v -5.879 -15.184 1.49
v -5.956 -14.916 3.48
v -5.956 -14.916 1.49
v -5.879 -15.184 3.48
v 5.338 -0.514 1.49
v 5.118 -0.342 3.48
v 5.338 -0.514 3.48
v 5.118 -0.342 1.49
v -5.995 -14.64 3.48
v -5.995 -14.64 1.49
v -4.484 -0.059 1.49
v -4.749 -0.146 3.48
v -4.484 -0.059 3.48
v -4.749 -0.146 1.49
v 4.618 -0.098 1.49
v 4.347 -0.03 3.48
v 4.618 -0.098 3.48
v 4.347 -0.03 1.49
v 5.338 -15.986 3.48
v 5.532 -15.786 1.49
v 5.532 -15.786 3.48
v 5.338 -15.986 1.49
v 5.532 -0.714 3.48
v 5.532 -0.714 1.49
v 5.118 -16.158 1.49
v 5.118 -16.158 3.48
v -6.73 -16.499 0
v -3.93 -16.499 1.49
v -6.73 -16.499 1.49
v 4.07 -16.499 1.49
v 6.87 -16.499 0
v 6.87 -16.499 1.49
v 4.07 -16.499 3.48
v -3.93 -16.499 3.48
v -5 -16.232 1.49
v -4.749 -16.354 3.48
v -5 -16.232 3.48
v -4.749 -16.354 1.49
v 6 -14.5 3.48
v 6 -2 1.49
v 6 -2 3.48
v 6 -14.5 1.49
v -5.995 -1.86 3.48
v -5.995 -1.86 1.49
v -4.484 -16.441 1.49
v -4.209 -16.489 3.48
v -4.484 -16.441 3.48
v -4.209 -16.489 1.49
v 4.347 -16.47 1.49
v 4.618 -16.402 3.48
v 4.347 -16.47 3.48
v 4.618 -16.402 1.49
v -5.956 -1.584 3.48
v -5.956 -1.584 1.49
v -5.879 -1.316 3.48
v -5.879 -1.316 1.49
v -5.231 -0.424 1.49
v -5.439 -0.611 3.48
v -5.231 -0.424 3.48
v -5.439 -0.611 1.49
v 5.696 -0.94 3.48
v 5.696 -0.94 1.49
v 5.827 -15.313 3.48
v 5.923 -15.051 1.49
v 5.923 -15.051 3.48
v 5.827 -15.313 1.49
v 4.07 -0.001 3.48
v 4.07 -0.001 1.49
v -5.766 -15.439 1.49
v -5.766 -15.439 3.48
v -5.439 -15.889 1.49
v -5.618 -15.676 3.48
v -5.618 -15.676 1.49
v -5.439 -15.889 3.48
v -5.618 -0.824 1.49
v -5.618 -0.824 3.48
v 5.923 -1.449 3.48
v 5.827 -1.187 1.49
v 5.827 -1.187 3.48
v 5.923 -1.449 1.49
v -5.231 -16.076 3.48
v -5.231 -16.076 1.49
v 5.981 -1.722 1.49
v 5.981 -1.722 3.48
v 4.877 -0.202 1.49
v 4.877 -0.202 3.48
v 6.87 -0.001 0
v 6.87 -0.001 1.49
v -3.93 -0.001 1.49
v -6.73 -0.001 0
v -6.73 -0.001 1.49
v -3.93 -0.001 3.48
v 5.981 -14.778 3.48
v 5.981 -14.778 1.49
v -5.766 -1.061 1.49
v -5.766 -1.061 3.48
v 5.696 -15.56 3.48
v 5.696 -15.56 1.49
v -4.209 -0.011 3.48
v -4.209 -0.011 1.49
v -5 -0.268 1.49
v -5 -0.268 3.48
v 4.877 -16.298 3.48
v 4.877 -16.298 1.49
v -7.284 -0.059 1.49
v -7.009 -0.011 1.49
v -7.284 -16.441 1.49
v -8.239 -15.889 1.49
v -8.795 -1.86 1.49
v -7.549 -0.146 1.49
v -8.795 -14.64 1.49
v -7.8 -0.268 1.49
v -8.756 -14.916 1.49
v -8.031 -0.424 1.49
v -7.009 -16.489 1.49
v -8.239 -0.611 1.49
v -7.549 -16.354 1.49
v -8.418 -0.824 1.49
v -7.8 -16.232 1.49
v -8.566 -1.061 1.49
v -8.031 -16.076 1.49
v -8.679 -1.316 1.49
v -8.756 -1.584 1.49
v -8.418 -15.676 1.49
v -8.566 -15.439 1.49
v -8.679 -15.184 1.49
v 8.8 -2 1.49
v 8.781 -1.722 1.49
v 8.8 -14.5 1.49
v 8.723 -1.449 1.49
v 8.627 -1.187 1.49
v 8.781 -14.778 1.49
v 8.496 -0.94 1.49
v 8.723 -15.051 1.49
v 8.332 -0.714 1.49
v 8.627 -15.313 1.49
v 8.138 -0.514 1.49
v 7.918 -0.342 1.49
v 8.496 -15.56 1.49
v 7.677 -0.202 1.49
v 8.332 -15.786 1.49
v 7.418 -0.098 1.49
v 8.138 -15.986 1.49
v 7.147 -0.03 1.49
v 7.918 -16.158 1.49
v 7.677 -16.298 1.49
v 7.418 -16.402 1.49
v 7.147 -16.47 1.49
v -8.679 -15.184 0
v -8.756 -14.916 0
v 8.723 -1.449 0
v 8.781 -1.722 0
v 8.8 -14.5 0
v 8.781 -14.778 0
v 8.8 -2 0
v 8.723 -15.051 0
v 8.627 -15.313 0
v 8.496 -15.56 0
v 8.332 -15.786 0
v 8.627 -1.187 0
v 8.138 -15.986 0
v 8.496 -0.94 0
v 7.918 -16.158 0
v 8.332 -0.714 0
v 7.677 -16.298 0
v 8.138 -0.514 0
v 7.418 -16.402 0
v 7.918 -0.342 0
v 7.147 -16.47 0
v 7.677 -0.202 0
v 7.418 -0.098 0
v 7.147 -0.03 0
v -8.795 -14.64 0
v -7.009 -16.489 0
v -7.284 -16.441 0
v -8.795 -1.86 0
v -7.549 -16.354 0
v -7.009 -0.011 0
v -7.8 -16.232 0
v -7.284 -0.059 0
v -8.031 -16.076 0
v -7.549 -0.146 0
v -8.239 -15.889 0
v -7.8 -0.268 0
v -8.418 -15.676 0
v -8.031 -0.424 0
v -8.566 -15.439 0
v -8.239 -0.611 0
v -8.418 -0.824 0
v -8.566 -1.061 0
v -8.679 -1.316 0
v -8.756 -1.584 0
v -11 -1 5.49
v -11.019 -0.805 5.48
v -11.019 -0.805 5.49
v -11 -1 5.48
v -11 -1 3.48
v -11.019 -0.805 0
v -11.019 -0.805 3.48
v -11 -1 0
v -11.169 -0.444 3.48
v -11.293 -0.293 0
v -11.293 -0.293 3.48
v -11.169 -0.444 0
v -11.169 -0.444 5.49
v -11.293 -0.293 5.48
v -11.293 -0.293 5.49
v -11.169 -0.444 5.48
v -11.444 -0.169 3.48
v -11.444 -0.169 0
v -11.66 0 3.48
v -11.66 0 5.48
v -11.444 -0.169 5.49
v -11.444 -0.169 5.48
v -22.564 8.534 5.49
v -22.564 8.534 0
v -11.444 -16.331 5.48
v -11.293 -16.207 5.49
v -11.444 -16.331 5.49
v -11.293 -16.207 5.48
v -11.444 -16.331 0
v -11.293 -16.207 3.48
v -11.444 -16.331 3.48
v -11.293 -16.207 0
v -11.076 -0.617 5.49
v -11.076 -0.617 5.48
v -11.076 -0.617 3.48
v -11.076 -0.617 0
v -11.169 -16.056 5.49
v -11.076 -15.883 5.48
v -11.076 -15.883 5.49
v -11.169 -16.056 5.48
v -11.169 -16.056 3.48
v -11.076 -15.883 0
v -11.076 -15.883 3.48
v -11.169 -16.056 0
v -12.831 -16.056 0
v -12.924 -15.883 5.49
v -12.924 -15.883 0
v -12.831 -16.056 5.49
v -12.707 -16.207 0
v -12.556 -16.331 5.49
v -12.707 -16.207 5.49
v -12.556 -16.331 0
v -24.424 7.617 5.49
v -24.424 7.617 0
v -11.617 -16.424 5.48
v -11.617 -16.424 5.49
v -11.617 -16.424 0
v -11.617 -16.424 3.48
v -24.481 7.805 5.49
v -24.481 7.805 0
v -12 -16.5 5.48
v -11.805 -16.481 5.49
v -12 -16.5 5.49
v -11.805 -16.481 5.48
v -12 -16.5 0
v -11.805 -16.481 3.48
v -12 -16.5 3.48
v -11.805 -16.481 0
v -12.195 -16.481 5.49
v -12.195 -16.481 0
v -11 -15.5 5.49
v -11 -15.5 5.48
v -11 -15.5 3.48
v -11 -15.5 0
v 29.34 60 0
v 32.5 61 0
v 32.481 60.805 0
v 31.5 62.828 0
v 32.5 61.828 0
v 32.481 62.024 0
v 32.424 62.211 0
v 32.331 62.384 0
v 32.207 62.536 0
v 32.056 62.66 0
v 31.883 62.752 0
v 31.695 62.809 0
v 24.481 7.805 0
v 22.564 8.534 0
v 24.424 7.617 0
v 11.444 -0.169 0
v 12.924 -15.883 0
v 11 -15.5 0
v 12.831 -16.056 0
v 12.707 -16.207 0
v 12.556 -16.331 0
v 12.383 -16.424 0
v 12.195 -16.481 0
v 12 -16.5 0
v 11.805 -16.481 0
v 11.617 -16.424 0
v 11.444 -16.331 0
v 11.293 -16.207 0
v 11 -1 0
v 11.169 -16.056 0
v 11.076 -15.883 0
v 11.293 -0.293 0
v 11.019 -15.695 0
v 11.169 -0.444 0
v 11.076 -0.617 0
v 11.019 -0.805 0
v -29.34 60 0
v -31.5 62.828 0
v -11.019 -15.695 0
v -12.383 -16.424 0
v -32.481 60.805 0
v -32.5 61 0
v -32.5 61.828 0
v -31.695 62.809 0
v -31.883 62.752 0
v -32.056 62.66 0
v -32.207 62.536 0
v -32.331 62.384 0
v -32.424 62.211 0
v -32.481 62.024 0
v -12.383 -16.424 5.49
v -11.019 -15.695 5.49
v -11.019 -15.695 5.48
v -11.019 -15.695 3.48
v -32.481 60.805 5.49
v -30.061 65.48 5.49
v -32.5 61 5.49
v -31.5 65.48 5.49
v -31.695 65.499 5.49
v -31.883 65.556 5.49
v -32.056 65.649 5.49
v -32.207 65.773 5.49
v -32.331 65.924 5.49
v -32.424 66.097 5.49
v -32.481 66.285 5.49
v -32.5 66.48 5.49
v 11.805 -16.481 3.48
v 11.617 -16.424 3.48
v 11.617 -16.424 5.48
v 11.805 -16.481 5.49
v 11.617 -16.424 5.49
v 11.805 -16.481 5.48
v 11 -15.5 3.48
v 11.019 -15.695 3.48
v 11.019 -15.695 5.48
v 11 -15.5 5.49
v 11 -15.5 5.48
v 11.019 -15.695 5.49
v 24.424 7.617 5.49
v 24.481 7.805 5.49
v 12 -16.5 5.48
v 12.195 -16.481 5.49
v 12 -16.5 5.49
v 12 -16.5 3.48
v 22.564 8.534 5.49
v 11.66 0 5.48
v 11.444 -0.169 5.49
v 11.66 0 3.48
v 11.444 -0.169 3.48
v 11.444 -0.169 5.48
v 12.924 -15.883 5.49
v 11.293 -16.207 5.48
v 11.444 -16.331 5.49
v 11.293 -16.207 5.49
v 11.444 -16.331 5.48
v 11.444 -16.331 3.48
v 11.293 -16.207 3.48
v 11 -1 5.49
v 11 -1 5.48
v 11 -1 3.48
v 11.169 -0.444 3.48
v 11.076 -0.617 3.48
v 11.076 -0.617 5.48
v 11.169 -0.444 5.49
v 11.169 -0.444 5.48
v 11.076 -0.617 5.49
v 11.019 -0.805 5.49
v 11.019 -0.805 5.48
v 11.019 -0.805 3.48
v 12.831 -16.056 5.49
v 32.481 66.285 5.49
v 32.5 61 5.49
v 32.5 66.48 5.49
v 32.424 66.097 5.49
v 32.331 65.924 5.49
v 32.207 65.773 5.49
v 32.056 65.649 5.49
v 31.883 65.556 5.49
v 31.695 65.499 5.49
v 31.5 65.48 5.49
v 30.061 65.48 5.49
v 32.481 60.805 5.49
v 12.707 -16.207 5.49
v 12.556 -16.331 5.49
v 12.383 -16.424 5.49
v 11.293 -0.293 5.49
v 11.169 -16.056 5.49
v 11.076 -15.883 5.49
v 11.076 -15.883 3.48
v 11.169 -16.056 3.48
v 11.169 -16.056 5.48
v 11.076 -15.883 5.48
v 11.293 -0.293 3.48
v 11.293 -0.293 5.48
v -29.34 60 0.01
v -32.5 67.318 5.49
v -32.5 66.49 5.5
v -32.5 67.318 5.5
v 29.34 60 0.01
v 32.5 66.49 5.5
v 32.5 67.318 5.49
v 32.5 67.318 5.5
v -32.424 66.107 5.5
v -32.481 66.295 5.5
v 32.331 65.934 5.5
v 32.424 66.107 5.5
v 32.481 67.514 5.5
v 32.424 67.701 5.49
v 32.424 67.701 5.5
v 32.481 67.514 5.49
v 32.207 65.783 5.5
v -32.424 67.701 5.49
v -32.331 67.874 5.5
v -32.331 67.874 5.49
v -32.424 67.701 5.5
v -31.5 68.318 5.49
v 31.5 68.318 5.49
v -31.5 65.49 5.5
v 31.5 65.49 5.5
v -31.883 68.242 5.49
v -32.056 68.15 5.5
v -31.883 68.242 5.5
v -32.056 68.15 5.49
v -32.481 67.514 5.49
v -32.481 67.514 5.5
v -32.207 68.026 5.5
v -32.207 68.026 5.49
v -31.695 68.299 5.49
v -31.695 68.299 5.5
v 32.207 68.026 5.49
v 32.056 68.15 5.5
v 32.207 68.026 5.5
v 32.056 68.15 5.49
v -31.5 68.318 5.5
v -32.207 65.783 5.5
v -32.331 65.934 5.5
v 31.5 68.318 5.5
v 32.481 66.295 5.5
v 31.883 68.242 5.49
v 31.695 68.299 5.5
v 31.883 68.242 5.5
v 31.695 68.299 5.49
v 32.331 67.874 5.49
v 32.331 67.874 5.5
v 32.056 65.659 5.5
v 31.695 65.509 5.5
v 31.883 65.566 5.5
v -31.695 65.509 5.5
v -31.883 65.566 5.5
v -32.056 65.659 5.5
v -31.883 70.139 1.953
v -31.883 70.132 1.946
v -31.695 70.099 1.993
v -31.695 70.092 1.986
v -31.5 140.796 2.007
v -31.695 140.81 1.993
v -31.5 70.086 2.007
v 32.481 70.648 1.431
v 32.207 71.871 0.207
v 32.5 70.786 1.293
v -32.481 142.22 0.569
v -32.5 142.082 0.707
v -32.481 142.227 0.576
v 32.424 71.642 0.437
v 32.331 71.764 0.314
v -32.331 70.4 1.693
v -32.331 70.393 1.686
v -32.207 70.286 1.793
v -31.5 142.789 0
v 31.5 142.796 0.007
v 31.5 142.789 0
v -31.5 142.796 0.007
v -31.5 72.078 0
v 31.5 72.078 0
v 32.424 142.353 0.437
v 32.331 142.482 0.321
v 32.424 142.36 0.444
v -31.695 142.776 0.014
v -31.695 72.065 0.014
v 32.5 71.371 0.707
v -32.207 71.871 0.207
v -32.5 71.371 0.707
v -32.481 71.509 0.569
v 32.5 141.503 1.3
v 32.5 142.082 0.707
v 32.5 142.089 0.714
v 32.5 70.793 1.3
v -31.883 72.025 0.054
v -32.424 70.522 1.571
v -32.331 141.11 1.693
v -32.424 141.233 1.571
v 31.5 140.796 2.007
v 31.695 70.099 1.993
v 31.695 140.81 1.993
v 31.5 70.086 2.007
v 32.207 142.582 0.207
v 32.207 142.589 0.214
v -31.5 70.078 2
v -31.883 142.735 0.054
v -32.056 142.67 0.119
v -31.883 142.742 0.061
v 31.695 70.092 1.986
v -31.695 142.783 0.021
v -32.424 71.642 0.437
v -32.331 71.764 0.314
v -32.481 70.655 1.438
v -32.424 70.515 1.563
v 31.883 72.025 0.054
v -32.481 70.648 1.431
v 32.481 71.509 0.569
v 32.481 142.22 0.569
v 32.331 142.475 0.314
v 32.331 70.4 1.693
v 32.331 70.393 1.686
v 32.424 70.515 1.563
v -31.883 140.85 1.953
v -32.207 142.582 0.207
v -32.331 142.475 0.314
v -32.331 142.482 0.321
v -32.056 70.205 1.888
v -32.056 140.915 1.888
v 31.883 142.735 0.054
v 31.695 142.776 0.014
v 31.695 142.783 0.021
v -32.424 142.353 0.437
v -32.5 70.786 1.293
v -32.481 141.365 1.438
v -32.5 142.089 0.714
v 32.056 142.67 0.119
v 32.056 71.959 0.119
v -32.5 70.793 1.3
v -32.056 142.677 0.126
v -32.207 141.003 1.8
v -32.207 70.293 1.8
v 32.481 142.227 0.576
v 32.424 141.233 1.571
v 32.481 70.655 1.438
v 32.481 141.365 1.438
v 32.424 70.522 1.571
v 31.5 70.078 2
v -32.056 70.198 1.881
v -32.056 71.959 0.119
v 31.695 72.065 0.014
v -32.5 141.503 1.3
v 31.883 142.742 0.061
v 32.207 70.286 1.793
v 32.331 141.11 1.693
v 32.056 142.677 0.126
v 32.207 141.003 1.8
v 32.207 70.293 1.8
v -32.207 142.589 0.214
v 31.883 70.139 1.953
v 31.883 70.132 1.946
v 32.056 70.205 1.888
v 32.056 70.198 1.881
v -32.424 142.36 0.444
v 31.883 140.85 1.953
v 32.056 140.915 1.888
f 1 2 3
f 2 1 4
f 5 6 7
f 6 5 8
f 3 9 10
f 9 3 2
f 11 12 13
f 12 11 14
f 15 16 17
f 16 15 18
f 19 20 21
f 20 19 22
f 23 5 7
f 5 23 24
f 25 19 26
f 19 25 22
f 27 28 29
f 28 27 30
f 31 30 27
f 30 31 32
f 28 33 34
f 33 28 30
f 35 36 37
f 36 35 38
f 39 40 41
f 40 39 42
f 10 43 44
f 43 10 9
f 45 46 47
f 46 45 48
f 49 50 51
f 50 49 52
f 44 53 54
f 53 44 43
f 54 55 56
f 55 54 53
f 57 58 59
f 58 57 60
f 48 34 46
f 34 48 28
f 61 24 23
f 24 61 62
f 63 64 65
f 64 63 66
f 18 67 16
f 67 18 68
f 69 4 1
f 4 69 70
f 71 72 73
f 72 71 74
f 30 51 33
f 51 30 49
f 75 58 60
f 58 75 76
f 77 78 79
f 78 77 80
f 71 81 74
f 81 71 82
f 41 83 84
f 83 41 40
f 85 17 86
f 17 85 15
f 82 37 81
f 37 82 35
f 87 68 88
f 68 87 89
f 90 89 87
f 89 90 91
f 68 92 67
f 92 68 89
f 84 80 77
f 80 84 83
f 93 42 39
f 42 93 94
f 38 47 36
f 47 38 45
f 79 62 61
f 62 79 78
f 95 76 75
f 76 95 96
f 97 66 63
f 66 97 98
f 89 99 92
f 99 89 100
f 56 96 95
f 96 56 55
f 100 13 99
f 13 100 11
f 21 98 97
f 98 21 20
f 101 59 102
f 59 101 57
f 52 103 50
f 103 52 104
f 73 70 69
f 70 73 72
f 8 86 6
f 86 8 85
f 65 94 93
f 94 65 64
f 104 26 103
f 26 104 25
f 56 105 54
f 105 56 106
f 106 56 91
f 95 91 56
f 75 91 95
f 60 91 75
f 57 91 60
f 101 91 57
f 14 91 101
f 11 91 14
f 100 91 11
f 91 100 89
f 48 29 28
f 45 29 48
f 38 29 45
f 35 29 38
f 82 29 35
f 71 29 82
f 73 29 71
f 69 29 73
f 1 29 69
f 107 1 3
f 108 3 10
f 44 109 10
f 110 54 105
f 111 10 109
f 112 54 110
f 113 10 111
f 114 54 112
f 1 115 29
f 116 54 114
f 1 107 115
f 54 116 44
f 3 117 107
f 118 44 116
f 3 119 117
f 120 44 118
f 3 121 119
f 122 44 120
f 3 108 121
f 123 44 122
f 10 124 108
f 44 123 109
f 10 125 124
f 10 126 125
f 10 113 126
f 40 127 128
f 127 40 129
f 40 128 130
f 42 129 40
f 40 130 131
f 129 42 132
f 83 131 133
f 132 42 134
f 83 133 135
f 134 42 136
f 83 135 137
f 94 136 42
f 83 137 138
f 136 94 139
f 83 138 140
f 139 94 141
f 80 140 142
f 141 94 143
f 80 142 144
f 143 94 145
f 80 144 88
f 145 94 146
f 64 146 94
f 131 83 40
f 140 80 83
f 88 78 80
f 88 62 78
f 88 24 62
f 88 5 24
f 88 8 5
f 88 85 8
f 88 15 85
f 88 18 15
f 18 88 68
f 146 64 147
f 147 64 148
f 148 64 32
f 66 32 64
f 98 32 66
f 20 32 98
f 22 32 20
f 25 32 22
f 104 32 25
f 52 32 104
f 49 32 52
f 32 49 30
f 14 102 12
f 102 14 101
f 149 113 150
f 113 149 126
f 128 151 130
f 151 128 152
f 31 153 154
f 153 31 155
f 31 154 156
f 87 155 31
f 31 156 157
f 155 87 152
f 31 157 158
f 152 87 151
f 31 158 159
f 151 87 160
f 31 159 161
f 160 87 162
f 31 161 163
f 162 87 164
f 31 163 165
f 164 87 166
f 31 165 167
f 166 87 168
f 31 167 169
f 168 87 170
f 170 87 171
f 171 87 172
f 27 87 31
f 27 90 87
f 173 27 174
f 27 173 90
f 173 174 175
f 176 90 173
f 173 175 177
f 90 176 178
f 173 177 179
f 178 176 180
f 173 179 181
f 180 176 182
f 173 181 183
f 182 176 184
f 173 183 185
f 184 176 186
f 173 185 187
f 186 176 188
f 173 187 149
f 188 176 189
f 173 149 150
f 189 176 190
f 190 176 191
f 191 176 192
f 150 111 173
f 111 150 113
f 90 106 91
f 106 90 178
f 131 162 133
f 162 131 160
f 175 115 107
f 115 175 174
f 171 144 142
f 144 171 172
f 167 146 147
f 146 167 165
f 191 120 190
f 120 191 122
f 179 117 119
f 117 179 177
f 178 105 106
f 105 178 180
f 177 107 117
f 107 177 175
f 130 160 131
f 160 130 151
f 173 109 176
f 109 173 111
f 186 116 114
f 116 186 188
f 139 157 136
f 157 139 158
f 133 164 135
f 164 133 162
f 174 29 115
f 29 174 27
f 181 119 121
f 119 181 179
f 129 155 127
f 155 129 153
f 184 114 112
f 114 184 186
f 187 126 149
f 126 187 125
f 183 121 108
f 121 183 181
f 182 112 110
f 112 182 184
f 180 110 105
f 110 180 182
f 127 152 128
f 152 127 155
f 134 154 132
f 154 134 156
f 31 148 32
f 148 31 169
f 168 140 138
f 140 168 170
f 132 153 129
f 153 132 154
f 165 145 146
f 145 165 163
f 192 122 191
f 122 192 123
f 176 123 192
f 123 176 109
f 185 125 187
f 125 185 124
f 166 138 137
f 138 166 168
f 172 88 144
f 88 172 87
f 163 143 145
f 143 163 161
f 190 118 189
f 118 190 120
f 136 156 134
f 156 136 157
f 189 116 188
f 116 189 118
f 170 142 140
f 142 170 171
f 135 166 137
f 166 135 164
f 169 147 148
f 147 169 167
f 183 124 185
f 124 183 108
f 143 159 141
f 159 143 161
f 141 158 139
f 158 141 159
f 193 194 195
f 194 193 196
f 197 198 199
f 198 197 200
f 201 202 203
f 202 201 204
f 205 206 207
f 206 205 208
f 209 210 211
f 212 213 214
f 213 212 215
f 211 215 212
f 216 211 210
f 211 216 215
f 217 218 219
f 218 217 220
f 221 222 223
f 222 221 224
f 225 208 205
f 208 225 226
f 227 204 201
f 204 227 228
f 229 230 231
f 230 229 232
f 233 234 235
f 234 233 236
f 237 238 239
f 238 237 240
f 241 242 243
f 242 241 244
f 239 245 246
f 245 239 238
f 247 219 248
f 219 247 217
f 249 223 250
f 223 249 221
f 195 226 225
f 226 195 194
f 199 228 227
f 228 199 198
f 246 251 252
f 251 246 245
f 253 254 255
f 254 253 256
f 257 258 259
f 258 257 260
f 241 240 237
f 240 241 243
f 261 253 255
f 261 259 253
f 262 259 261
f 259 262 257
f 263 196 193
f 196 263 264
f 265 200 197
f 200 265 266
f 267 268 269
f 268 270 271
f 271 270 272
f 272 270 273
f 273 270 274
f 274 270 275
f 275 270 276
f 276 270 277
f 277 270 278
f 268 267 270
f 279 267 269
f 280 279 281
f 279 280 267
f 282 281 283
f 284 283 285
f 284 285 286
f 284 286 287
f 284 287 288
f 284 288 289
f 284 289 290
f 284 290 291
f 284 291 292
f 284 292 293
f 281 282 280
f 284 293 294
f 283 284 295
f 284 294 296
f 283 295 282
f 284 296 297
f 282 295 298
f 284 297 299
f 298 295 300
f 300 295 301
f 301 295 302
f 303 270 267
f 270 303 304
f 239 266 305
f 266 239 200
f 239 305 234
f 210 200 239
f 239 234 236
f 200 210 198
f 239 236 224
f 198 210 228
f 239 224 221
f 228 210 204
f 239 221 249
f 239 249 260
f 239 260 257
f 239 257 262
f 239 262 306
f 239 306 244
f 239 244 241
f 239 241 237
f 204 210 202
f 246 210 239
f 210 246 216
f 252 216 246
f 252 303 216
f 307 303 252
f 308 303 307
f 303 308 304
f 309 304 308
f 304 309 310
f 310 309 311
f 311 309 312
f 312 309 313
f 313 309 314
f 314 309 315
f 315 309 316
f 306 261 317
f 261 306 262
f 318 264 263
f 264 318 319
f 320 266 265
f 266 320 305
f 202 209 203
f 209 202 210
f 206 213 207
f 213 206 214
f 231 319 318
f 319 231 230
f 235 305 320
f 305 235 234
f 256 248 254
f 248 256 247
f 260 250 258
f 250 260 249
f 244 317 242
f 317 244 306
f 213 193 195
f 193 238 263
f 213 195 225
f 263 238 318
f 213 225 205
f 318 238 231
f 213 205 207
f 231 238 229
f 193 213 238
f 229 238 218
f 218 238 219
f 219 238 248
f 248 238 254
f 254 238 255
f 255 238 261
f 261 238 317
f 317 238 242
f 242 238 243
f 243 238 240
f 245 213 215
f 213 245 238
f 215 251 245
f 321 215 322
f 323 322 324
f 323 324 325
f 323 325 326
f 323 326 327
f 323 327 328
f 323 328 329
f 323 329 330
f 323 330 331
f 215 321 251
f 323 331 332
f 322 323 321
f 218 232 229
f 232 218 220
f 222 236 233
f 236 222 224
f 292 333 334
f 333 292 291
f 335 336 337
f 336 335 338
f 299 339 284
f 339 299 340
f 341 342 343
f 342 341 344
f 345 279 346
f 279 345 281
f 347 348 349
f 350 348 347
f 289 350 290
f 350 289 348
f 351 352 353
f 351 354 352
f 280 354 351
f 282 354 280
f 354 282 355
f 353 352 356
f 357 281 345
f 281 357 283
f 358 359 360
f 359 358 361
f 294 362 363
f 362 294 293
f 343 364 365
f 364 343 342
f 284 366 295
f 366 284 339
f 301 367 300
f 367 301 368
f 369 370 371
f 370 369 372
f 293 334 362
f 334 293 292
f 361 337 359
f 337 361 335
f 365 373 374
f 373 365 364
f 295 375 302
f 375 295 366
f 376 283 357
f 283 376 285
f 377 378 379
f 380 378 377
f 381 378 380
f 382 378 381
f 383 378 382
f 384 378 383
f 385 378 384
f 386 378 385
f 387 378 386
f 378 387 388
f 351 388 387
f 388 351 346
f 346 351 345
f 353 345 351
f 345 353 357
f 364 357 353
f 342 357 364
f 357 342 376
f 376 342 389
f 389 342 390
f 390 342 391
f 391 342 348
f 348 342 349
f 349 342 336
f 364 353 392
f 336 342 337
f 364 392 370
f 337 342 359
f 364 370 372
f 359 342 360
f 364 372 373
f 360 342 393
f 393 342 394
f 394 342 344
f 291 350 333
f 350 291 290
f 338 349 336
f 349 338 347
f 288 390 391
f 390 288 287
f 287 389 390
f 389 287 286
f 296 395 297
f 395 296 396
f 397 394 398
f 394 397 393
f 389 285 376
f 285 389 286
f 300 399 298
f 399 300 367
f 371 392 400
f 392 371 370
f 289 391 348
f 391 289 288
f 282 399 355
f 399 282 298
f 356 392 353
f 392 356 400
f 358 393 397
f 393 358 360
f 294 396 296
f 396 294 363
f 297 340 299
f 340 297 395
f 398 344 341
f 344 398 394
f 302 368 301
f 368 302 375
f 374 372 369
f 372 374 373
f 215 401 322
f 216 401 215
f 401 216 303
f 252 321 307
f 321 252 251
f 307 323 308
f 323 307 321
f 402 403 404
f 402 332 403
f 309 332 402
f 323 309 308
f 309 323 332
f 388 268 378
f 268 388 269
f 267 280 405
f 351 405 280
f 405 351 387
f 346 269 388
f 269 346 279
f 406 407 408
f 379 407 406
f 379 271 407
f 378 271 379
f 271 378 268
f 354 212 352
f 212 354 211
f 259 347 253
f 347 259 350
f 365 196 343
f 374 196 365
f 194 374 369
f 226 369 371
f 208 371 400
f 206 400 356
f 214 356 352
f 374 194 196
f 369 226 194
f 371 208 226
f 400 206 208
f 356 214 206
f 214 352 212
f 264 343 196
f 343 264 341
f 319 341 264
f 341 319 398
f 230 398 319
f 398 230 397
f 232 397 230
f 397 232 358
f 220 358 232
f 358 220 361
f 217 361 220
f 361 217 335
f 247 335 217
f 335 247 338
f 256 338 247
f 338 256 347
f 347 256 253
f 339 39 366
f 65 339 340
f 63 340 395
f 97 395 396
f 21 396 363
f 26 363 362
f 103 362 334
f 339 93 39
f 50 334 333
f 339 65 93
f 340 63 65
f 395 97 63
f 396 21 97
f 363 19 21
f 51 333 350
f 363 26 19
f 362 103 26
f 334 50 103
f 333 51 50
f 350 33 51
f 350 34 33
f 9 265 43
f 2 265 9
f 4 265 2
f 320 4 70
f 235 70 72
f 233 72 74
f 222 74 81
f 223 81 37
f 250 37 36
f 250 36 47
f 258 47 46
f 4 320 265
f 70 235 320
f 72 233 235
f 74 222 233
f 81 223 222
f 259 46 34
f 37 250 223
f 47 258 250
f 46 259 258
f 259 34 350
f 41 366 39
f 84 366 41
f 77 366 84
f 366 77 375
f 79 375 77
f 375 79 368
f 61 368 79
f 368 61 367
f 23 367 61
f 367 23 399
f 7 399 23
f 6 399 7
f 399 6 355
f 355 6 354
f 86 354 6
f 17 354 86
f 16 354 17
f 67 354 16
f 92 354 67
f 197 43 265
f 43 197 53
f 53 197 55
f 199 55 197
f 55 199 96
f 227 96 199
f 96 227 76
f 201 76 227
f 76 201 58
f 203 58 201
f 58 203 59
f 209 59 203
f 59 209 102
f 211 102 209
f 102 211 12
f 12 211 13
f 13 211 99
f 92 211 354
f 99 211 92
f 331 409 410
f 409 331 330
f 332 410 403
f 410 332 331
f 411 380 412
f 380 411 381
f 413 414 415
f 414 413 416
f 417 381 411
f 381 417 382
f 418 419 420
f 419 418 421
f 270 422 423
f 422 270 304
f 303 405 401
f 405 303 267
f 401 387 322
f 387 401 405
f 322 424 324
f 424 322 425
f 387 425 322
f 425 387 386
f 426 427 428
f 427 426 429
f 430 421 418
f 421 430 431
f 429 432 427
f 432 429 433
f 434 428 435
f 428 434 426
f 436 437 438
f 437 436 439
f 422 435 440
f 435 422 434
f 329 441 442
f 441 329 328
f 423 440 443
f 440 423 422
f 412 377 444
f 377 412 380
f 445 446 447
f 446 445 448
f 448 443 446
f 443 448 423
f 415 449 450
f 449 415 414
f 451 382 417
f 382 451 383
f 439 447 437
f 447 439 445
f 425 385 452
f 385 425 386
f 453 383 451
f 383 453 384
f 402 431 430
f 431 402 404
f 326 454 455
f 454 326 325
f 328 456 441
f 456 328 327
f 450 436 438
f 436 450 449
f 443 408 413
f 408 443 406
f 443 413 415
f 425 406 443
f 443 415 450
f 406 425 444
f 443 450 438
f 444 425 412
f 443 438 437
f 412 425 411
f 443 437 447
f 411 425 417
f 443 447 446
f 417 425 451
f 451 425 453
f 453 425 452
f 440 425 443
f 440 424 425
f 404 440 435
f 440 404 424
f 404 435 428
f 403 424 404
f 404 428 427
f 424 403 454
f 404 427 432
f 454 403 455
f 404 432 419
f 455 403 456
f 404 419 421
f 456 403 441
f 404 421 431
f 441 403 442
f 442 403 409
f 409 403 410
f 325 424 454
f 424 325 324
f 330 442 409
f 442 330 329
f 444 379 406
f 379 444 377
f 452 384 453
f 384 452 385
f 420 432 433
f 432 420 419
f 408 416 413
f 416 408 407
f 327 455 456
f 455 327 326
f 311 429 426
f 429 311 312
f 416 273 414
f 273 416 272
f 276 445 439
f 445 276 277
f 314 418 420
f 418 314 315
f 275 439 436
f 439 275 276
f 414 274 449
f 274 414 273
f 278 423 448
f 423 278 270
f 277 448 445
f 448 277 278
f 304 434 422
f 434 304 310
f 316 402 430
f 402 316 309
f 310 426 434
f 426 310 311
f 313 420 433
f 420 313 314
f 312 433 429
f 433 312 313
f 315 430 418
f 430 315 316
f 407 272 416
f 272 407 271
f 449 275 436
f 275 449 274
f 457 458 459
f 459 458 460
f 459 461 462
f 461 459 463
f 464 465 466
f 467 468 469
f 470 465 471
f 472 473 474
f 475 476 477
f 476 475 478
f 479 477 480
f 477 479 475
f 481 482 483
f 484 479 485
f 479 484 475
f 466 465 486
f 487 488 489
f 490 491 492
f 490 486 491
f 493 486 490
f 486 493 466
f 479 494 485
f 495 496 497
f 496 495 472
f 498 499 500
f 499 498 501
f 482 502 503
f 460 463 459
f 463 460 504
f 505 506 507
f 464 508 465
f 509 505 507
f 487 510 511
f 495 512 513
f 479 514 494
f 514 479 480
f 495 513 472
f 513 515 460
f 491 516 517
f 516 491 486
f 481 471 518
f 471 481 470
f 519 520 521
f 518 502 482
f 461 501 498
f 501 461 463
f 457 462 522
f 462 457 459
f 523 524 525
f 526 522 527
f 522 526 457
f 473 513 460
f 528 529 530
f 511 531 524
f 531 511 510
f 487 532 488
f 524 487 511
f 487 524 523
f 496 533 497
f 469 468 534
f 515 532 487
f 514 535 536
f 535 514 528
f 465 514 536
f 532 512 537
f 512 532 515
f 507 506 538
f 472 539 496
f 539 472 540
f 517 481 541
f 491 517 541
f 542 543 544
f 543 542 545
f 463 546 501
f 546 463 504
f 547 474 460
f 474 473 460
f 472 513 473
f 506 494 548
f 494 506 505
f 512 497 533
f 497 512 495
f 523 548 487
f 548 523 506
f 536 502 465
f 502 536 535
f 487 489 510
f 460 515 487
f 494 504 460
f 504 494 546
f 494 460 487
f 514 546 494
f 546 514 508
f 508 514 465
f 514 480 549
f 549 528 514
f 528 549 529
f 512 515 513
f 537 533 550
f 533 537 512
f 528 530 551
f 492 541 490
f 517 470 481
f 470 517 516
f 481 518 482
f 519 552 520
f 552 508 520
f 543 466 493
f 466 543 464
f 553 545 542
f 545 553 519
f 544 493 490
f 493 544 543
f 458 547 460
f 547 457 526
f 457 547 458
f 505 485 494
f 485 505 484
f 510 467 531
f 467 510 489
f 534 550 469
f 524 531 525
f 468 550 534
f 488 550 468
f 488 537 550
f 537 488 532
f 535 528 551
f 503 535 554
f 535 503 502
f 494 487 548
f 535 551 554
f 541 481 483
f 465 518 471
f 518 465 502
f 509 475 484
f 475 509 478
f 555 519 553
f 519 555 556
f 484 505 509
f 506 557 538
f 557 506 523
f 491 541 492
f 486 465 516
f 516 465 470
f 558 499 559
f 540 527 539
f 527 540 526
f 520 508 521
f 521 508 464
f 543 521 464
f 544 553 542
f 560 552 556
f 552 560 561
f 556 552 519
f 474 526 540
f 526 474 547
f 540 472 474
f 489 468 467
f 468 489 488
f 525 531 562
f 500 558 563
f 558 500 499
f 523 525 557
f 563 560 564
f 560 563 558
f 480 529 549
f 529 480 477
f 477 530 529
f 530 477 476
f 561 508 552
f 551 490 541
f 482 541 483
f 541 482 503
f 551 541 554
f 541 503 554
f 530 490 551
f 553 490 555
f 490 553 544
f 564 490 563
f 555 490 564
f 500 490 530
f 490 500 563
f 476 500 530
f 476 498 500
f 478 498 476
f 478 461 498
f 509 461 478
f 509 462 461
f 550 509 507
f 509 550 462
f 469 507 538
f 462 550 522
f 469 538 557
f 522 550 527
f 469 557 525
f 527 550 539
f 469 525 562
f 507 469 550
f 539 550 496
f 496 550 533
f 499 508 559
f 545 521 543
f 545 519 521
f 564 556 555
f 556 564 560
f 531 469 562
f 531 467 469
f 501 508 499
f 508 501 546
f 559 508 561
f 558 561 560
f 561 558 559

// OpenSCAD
// Parametric Hotshoe Mount Flash Diverter V1
// https://www.thingiverse.com/thing:3490495
// by Bikecyclist
// https://www.thingiverse.com/Bikecyclist


/* [Reflector Parameters] */

// Reflector vertical extension (when mounted)
z_reflector = 50;

// Reflector horizontal width
w_reflector = 65;

// Reflector angle from horizontal (degrees)
a_reflector = 45;

// Reflector horizontal distance (bottom edge, from forward hotshoe foot surface)
d_reflector = 60;

/* [Mount Parameters] */

// Thickness of mount and reflector plate
th_mount = 2;

// Mount width at the rear
w_rear_center = 22;

// Mount height at the rear (above hotshoe foot and leg)
h_rear = 2;

// Horizontal distance where the mount is clear from the flash(from forward hotshoe foot surface)
d_clear_rear = 8;

// Minimum width needed to clear the extending flash (flash width plus generous tolerance)
w_min_clear = 45;

// Chamfer radius for mount parts
r_frame = 1;

/* [Hot Shoe Dimensions] */

// Tolerance for the hot-shoe foot and leg
foot_tol = 0.5; // default = 0.5

// Nominal width of the hot shoe "leg"
w_leg_nominal = 12.5; // default = 12.5

// Height of the hot shoe leg
h_leg = 2; // default = 2

// Nominal width of the hot shoe foot
w_foot_nominal = 18.1;

// Nominal length of the hot shoe foot
l_foot = 16.5;

// Nominal height of the hot shoe foot
h_foot_nominal = 1.99;

// Corner radius of the hot shoe foot
r_foot = 2;

w_foot = w_foot_nominal - foot_tol;
h_foot = h_foot_nominal - foot_tol;
w_leg = w_leg_nominal - foot_tol;

/* [Hidden] */

// Minimum Facet Angle
$fa = 8;

// Minimum Facet Size
$fs = 0.2;

// Small distance to ensure proper meshing
eps = 0.01;




translate ([0, -l_foot/2, 0])
{
    foot ();
    body ();
    
    translate ([0, l_foot + d_reflector + th_mount / cos (a_reflector), th_mount/2])
    rotate ([-90 + a_reflector, 0, 0])
    translate ([0, -(l_foot/2 + 0.5 * th_mount/cos (a_reflector) + d_reflector), 0])
    adapter (z_reflector);
}

module foot ()
{
    translate ([0, 0, h_foot])
        rcube ([w_leg, l_foot, h_leg], r_foot);

    rcube ([w_foot, l_foot, h_foot], r_foot);
}

module adapter (h_adapter)
{
    translate ([0, l_foot/2 + 0.5 * th_mount/cos (a_reflector) + d_reflector, 0])
    hull ()
    {
        rcube ([w_reflector, th_mount/cos (a_reflector), eps], r_frame);
        
        translate ([0, h_adapter * tan (a_reflector), h_adapter])
        rcube ([w_reflector, th_mount/cos (a_reflector), eps], r_frame);
    }
}

module body ()
{
    intersection ()
    {
        union ()
        {
            // Rear Top
            translate ([0, 0, h_leg + h_foot - eps])
            rcube ([w_rear_center + 2 * th_mount, l_foot, h_rear], r_frame);
            
            for (i = [-1, 1])
            hull ()
            {
                // Rear Sides
                translate ([i * (w_rear_center/2 + th_mount/2), 0, 0])
                rcube ([th_mount, l_foot, h_leg + h_foot + h_rear], r_frame);
                
                // Rear Min Width
                translate ([i * (w_min_clear/2 + th_mount/2), l_foot/2 + d_clear_rear, 0])
                cylinder (d = th_mount, h = h_leg + h_foot + h_rear);
            }
            
            for (i = [-1, 1])
            hull ()
            {
                // Rear Min Width
                translate ([i * (w_min_clear/2 + th_mount/2), l_foot/2 + d_clear_rear, 0])
                cylinder (d = th_mount, h = h_leg + h_foot + h_rear);
                
                // Front reflector carrier
                l = (h_leg + h_foot + h_rear)/cos (a_reflector);
                translate ([i * (w_reflector - th_mount)/2, d_reflector + l_foot + (l - l_foot + th_mount)/2, 0])
                rcube ([th_mount, l + th_mount, h_leg + h_foot + h_rear], r_frame);
            }
            
            adapter (h_leg + h_foot + h_rear);
        }
        
        hull ()
        {
            adapter (h_leg + h_foot + h_rear);
            
            translate ([0, -2 * d_reflector, 0])
            adapter (h_leg + h_foot + h_rear);
        }
    }
    
}

module rcube (dim, r)
{
    linear_extrude (dim [2])
    hull ()
    for (i = [-1, 1], k = [-1, 1])
        translate ([i/2 * (dim [0] - 2 * r), k/2 * (dim [1] - 2 * r)])
        circle (r = r);
}
